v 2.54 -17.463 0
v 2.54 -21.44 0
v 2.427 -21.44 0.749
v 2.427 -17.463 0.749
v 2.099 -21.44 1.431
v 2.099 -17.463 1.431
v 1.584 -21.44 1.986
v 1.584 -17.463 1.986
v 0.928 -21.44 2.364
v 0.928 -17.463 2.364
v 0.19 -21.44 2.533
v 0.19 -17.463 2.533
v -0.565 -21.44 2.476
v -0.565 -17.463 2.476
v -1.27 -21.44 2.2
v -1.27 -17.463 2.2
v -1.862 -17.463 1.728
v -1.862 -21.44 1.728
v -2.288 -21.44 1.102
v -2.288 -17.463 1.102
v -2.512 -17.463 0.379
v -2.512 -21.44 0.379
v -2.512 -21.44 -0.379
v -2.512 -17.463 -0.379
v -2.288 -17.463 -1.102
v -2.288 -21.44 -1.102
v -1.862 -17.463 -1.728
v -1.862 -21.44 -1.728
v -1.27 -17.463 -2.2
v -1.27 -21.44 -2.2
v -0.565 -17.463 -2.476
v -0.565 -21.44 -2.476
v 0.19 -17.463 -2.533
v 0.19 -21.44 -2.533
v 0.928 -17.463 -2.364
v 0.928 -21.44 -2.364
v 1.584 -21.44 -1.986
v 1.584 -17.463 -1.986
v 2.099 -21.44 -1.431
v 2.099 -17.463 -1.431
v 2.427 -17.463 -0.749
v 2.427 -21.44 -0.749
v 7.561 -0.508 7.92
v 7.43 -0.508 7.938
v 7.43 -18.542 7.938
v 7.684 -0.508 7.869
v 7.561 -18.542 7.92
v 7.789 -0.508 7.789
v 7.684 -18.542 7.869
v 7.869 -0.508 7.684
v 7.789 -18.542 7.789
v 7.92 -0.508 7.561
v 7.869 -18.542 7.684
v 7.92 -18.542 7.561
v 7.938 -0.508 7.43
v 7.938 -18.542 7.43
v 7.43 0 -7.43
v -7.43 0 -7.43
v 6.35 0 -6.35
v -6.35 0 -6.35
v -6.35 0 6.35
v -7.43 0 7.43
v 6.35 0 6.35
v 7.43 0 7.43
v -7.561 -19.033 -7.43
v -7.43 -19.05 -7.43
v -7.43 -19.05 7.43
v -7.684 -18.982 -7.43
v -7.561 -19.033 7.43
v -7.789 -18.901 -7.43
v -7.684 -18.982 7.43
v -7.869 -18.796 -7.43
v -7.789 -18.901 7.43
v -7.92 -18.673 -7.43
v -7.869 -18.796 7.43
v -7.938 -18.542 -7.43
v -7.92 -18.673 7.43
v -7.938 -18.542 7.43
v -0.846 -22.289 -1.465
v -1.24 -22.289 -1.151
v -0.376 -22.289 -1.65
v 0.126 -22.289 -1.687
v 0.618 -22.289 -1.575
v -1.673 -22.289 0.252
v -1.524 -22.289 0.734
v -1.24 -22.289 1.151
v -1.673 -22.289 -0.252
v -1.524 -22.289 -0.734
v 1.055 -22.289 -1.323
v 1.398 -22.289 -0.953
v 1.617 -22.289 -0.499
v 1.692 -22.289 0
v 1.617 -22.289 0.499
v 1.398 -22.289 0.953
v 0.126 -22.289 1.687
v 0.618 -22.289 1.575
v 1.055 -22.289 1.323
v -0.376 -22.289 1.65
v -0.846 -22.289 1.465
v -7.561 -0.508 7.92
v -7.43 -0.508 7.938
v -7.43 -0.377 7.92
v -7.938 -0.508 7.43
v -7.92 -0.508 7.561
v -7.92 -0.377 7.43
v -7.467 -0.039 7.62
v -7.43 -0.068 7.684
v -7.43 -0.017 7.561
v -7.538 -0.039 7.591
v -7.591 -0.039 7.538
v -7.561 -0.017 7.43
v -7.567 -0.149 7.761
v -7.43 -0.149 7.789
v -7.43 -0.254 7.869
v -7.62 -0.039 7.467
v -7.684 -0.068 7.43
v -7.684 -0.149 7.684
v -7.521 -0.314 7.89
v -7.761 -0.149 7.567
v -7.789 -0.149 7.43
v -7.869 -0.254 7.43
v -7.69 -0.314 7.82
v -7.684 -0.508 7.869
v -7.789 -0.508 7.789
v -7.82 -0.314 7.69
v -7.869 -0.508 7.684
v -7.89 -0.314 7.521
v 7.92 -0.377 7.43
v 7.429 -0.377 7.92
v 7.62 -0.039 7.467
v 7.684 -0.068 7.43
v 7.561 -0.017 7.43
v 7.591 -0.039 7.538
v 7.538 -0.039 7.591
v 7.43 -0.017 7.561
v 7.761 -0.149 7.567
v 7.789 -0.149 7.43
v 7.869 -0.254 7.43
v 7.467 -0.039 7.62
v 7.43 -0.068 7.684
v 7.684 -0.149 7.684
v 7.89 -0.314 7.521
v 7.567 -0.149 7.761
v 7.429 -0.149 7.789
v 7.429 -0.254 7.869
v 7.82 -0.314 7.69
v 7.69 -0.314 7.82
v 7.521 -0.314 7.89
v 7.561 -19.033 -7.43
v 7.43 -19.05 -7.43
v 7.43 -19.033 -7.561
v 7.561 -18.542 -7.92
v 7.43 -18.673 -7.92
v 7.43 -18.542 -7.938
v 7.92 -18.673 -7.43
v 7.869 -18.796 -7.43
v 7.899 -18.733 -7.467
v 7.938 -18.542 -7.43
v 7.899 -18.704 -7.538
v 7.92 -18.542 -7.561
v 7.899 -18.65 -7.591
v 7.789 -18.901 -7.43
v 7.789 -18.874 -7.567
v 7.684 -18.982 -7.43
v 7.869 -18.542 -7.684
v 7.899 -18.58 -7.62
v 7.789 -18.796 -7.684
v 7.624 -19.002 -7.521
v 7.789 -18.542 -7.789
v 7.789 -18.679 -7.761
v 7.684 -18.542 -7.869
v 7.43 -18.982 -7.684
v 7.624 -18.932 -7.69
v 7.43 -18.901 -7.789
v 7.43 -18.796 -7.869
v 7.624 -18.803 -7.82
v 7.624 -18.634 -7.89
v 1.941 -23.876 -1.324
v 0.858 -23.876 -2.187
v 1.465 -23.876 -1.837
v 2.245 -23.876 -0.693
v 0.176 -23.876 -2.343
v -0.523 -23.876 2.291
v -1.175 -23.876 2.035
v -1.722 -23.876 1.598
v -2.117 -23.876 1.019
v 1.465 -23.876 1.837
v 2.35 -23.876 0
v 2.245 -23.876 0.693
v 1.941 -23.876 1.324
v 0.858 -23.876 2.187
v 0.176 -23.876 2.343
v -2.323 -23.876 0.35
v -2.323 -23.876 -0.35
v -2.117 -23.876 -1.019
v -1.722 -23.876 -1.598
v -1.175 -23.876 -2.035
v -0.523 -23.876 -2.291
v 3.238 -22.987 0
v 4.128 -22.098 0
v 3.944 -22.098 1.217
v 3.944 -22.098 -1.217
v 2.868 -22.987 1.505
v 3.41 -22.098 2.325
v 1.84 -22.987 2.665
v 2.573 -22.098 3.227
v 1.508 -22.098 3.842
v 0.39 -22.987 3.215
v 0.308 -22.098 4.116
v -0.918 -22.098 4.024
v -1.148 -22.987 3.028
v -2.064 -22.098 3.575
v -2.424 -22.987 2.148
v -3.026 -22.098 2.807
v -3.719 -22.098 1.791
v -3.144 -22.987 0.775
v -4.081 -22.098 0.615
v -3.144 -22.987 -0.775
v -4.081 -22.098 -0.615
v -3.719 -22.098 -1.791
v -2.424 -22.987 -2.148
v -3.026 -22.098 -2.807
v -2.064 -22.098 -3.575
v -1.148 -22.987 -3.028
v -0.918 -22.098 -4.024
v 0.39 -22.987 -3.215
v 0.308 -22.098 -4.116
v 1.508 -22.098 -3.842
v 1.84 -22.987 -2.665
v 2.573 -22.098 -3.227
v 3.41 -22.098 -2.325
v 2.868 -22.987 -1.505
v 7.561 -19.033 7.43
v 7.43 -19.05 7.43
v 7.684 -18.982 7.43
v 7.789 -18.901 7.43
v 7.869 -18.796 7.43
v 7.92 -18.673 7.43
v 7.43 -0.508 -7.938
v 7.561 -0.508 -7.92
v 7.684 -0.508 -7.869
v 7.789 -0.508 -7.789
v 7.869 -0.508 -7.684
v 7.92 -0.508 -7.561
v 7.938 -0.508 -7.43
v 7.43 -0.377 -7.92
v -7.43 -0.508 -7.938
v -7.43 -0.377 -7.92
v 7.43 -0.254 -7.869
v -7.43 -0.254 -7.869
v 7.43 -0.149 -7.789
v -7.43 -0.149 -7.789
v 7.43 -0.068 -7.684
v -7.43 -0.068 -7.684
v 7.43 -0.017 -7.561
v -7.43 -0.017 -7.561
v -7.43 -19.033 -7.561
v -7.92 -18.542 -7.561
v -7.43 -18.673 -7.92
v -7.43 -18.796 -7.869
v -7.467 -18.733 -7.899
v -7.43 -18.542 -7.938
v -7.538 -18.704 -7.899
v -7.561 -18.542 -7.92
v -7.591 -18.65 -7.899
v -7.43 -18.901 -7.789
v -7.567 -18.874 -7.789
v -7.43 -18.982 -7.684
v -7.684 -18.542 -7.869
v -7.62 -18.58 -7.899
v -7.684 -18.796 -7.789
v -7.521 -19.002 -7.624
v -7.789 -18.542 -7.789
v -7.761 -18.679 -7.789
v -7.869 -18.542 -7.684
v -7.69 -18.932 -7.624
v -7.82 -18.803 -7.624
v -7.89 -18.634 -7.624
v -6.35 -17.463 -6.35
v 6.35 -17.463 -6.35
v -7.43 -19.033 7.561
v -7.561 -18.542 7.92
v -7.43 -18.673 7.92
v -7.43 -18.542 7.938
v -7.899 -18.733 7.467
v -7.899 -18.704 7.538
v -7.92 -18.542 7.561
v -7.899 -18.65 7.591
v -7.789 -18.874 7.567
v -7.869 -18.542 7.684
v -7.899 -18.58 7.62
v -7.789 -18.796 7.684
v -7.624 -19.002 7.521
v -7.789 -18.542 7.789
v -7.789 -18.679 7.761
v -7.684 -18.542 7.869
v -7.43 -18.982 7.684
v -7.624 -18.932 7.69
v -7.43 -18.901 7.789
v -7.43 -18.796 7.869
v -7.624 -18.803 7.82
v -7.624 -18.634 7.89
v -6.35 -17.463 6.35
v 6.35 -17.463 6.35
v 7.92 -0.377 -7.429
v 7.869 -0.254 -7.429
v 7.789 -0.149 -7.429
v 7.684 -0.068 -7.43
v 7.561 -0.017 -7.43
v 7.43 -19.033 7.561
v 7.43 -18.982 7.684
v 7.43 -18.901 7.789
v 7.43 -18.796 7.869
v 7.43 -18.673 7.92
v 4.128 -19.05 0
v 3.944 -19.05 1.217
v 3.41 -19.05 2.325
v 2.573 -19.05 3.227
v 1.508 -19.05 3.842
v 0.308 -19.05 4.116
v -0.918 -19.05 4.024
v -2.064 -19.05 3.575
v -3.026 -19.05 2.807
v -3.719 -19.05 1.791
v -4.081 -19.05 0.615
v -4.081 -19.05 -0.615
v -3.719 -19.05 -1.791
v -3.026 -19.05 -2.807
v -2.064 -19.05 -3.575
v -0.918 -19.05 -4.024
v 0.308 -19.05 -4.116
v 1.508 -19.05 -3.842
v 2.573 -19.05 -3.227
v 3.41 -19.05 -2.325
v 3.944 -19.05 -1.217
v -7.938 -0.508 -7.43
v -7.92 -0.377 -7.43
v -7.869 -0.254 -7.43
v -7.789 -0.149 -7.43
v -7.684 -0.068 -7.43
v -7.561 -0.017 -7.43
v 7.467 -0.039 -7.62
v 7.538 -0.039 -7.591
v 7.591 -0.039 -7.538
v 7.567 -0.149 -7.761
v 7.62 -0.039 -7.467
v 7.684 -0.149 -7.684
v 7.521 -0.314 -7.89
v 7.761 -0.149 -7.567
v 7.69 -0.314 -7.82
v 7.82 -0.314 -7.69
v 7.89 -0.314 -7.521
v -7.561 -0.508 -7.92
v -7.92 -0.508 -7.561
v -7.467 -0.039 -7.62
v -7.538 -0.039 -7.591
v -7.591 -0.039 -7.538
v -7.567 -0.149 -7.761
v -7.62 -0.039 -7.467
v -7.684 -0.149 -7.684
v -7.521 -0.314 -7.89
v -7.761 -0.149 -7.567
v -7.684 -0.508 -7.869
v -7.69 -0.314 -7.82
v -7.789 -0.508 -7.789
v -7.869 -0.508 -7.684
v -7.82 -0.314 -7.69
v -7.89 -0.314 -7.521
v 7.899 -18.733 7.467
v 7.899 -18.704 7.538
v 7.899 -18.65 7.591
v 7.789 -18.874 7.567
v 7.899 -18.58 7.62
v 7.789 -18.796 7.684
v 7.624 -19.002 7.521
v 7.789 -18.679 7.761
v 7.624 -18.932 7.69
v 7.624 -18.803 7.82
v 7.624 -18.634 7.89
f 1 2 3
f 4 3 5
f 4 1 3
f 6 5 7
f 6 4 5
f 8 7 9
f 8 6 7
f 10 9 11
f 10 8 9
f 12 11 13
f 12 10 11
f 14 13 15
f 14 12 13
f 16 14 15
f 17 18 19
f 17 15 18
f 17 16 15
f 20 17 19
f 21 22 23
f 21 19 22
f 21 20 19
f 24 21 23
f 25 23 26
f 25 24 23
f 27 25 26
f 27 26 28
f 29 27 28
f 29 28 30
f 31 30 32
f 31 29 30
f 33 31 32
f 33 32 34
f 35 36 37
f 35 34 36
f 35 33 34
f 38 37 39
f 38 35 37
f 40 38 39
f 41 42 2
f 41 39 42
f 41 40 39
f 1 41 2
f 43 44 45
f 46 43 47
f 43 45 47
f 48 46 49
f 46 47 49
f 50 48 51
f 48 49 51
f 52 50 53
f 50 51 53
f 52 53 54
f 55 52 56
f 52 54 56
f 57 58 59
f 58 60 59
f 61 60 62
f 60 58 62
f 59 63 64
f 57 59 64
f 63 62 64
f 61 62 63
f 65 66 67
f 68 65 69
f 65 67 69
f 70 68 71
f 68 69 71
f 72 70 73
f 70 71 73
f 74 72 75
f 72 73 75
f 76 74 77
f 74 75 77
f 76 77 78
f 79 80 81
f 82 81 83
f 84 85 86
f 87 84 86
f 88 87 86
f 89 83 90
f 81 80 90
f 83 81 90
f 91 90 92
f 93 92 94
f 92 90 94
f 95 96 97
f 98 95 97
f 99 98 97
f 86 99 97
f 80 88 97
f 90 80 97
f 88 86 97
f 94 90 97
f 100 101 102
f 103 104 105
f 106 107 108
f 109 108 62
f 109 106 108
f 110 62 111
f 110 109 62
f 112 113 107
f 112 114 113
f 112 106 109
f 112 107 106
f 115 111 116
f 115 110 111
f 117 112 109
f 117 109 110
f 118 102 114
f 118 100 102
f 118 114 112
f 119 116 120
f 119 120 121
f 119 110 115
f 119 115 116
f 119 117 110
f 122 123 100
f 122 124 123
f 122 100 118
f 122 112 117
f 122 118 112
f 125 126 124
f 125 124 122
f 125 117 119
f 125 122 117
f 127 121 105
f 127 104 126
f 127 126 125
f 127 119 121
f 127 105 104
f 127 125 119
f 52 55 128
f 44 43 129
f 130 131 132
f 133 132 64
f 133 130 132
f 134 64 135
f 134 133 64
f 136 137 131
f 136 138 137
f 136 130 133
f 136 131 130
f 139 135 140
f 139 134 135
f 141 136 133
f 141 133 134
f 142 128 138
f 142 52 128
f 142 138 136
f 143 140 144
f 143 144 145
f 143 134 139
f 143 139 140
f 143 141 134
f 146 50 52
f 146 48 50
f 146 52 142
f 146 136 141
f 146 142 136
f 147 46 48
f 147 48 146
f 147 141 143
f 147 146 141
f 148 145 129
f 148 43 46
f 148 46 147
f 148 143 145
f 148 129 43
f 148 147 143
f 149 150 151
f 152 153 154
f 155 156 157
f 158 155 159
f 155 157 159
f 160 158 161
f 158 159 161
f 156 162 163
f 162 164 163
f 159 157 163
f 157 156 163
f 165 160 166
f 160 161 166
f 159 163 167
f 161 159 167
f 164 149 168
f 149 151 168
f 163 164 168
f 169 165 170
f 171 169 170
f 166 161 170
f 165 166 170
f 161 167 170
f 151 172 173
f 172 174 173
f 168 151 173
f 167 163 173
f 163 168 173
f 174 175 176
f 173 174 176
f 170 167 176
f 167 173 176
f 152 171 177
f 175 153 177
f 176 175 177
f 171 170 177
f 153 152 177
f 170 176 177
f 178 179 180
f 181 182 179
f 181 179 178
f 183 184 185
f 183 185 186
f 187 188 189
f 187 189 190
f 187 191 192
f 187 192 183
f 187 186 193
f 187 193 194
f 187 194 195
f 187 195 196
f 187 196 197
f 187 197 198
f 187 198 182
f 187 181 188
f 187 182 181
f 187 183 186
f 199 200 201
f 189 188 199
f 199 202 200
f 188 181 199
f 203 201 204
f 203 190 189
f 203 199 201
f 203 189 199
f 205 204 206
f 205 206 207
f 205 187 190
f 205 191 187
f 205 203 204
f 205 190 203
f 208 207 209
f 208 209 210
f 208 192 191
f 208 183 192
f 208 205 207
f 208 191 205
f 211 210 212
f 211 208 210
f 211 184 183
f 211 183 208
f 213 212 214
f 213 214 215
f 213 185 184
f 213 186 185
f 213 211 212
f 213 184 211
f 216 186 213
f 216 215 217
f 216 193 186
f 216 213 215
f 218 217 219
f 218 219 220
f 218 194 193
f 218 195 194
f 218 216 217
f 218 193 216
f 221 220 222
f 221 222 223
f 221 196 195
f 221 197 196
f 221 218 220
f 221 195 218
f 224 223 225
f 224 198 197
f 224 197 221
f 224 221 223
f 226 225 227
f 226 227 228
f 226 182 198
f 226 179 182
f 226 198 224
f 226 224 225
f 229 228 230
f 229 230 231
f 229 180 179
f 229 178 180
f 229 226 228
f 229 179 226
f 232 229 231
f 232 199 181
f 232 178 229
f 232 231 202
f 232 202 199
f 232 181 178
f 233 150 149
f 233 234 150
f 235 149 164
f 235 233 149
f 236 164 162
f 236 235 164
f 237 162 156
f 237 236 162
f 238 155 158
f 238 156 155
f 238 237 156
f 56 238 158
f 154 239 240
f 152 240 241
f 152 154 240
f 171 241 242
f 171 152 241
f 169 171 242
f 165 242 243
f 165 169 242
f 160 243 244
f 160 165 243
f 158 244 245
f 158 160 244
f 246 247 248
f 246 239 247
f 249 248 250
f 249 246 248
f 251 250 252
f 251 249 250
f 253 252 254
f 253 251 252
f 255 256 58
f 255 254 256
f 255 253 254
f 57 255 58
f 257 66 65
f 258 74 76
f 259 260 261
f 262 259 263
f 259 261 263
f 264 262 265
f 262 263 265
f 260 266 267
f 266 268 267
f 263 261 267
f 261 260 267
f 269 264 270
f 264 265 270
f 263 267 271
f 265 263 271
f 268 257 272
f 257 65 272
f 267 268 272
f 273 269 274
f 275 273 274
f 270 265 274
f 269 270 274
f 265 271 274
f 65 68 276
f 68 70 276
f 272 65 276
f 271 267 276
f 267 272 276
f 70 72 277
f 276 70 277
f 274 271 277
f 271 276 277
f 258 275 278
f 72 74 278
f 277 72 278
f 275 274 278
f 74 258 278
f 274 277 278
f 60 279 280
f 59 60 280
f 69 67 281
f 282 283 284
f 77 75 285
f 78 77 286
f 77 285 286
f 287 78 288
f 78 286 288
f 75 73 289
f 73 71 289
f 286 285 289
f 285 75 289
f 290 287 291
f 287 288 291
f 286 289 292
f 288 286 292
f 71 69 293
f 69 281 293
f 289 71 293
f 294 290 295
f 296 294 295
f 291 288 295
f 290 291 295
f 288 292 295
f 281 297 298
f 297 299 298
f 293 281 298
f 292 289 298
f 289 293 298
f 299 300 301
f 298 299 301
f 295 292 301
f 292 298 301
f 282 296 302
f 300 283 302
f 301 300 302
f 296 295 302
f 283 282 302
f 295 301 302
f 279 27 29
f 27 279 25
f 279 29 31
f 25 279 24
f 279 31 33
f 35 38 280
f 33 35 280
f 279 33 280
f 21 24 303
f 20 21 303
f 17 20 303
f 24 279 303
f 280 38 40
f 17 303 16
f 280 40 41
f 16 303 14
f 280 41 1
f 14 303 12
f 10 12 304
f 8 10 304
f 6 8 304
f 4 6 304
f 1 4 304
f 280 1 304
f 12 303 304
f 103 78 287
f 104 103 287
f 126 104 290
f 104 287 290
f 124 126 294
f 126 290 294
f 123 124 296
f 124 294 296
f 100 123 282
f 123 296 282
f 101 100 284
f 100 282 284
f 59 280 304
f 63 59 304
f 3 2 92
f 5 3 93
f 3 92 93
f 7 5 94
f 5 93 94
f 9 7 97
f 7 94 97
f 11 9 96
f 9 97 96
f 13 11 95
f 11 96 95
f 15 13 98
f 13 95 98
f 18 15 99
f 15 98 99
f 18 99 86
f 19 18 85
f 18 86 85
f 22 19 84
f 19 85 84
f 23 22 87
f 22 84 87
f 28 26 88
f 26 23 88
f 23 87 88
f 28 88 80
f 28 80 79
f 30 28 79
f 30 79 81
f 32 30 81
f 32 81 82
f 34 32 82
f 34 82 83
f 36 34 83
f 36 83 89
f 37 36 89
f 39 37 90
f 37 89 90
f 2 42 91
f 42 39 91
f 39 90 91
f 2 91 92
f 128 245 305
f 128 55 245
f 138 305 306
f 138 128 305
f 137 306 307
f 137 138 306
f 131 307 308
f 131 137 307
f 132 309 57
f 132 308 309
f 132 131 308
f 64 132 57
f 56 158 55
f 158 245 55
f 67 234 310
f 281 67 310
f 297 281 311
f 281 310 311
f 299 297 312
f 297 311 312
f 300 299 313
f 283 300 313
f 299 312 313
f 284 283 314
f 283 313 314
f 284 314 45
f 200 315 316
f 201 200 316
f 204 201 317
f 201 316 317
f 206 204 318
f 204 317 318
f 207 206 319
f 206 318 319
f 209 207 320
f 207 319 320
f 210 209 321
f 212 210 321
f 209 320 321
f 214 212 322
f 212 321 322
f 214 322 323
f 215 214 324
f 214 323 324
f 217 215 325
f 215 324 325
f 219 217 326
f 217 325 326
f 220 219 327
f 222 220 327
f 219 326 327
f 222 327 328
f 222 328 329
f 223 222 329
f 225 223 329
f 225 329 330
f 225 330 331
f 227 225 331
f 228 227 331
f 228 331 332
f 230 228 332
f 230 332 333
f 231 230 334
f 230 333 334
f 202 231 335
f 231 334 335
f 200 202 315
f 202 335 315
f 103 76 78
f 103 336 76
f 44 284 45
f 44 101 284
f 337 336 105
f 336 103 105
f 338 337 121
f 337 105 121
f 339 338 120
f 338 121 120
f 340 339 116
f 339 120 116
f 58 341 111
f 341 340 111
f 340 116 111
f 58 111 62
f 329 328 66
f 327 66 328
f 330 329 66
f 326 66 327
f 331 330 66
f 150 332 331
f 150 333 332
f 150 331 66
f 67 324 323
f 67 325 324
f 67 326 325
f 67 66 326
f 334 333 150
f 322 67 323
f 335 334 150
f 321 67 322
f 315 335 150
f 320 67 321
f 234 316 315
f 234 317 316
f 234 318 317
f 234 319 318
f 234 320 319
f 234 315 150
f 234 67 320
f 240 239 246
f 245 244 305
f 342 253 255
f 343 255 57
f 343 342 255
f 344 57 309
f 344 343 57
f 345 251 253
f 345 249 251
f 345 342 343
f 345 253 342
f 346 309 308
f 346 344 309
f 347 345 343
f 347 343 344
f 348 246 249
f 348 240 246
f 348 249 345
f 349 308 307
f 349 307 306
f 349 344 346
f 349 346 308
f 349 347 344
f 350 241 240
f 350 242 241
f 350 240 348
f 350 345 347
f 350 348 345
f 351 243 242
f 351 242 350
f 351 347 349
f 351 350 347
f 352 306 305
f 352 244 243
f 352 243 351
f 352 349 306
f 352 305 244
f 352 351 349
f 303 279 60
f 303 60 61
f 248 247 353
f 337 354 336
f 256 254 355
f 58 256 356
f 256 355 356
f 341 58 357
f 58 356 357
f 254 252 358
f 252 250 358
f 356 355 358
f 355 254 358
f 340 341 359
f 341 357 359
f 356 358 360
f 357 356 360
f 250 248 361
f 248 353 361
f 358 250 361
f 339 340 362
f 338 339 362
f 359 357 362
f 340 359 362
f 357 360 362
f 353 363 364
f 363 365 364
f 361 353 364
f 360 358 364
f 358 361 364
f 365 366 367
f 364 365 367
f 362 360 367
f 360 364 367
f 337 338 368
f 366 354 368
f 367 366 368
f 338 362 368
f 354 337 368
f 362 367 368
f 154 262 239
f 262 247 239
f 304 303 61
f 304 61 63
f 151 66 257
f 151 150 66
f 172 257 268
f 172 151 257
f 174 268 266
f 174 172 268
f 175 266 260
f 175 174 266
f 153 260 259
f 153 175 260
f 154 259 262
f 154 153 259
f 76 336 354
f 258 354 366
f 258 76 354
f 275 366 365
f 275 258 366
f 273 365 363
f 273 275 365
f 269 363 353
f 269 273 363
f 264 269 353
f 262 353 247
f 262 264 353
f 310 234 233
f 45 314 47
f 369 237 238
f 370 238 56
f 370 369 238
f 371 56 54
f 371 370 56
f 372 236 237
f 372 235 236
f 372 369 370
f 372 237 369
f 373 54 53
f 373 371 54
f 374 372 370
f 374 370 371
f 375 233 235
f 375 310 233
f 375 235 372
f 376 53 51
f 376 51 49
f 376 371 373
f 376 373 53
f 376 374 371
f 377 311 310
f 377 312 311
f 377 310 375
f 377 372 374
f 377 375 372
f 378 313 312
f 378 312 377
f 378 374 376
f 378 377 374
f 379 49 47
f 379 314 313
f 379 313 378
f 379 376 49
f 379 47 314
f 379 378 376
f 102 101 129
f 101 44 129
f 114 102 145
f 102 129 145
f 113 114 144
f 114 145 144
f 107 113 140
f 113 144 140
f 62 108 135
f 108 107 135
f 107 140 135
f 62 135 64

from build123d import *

# Parameters (mm, degrees)
F0_W     = 15.875
F0_H     = 15.875
F1_DEPTH = 19.05
F2_R     = 4.1275
F3_DEPTH = 4.826
F4_SIZE  = 1.778
F5_T     = -1.5875
F6_R     = 0.508


with BuildPart() as f1:
    # F0 (on Front) → F1 (new body)
    with BuildSketch(Plane.XZ):
        Rectangle(F0_W, F0_H)
    extrude(amount=F1_DEPTH)

    # F2 (on face) → F3 (join)
    with BuildSketch(Plane.XZ.offset(19.05)):
        Circle(F2_R)
    extrude(amount=F3_DEPTH)

    # F4
    f4_edges = [f1.edges().sort_by_distance(p)[0] for p in [
        (-4.1275, -23.876, 0),
    ]]
    chamfer(f4_edges, length=F4_SIZE)

    # F5
    f5_openings = [f1.faces().sort_by_distance(p)[0] for p in [
        (0, 0, 0),
    ]]
    offset(amount=F5_T, openings=f5_openings, kind=Kind.INTERSECTION)

    # F6
    f6_edges = [f1.edges().sort_by_distance(p)[0] for p in [
        (0, -19.05, 7.9375),
        (-7.9375, -19.05, 0),
        (0, -19.05, -7.9375),
        (7.9375, -19.05, 0),
        (-7.9375, -9.525, 7.9375),
        (-7.9375, -9.525, -7.9375),
        (7.9375, -9.525, 7.9375),
        (7.9375, -9.525, -7.9375),
        (0, 0, -7.9375),
        (7.9375, 0, 0),
        (0, 0, 7.9375),
        (-7.9375, 0, 0),
    ]]
    fillet(f6_edges, radius=F6_R)


solid = f1.part
